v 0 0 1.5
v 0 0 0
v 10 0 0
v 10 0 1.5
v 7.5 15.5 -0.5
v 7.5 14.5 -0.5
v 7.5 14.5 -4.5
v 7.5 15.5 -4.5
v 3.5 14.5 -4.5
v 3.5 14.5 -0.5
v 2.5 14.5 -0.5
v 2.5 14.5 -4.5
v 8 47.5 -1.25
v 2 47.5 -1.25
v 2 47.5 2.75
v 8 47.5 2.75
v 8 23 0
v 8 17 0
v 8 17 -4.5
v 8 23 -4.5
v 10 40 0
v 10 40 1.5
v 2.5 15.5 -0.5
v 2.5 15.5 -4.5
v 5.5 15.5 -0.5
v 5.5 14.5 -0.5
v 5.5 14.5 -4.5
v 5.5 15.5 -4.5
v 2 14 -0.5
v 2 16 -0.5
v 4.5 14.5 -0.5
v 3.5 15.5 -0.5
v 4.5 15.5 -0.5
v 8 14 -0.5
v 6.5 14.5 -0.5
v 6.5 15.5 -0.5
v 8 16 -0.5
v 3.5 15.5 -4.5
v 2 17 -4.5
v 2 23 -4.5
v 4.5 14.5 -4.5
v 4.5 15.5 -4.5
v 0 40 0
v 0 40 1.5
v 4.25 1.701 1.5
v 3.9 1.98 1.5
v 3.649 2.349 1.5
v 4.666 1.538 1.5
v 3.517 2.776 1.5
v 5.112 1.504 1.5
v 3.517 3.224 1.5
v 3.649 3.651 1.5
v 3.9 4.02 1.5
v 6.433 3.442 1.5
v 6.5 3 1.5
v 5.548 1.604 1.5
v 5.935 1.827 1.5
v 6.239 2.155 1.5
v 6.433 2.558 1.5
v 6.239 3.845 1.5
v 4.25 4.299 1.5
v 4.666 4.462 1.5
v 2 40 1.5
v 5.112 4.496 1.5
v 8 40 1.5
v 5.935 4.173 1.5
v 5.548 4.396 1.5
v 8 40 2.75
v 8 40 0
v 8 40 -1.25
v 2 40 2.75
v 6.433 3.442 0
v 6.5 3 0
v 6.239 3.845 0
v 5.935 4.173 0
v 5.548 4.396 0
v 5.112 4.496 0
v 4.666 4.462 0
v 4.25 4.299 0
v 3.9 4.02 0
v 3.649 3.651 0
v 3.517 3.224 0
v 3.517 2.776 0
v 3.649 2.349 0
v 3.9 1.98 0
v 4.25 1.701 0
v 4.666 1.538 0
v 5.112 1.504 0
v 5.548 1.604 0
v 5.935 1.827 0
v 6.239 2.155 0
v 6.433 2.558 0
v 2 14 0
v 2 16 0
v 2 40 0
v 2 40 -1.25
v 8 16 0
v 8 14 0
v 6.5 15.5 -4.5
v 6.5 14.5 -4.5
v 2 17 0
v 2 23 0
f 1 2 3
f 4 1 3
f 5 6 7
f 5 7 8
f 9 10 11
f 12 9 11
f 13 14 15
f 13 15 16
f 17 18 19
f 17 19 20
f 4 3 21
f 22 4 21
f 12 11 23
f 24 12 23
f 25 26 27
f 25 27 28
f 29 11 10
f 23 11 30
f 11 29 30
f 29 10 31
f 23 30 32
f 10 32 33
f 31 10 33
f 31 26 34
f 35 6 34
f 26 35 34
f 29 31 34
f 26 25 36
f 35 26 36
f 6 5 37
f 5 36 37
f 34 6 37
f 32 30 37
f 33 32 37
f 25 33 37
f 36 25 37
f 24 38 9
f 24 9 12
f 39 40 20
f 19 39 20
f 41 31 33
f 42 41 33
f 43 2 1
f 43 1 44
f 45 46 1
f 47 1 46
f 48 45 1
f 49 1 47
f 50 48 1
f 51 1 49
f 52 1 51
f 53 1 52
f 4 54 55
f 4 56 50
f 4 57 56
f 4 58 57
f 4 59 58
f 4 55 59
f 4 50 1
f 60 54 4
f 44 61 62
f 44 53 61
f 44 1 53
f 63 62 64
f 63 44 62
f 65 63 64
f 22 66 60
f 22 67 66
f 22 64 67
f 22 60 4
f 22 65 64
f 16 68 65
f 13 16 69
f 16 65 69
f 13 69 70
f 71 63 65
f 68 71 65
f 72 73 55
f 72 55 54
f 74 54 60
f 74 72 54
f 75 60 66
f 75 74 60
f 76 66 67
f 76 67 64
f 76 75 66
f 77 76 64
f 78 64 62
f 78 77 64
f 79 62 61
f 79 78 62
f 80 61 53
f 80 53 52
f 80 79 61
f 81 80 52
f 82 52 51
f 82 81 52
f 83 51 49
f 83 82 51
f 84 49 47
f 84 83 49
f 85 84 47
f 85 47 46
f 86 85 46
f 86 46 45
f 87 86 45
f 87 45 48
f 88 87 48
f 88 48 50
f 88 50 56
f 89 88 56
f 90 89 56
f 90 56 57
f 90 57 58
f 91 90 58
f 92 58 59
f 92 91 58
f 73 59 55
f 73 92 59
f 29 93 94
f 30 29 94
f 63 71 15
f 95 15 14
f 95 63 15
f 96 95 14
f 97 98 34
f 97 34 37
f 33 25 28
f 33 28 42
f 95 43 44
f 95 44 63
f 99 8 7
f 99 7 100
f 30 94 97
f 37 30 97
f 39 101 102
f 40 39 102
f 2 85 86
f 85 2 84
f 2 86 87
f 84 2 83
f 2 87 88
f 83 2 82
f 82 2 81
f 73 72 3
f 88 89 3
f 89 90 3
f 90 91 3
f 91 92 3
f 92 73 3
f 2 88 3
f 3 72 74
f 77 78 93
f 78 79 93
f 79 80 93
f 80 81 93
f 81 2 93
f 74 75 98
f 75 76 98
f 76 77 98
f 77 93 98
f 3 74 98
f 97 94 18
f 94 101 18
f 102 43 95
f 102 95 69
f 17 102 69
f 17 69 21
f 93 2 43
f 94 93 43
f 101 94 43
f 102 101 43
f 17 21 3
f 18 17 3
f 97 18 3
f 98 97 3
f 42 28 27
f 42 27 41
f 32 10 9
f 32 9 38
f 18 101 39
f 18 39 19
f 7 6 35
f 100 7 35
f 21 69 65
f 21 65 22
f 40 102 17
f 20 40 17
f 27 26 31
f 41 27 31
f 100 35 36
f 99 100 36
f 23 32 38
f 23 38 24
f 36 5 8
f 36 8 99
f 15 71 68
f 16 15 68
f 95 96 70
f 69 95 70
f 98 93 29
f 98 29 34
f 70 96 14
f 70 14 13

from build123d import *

# Parameters (mm, degrees)
SKETCH_2_W      = 10
SKETCH_2_H      = 40
SKETCH_2_R      = 1.5
EXTRUDE_1_DEPTH = 1.5
SKETCH_3_3_W    = 6
SKETCH_3_3_H    = 6
EXTRUDE_3_DEPTH = 6
SKETCH_3_4_W    = 6
SKETCH_3_4_H    = 2
EXTRUDE_4_DEPTH = 2
SKETCH_4_W      = 1
SKETCH_4_H      = 1
EXTRUDE_5_DEPTH = 4
SKETCH_6_W      = 6
SKETCH_6_H      = 4
EXTRUDE_6_DEPTH = 7.5


with BuildPart() as part:
    # 草圖2 → 填料-伸長1 (new body)
    with BuildSketch(Plane.XY):
        with Locations((5, 20)):
            Rectangle(SKETCH_2_W, SKETCH_2_H)
        with Locations((5, 3)):
            Circle(SKETCH_2_R, mode=Mode.SUBTRACT)
    extrude(amount=EXTRUDE_1_DEPTH)

    # 草圖3<3> → 填料-伸長3 (add)
    with BuildSketch(Plane.XY.offset(1.5)):
        with Locations((5, 20)):
            Rectangle(SKETCH_3_3_W, SKETCH_3_3_H)
    extrude(amount=-EXTRUDE_3_DEPTH)

    # 草圖3<4> → 填料-伸長4 (add)
    with BuildSketch(Plane.XY.offset(1.5)):
        with Locations((5, 15)):
            Rectangle(SKETCH_3_4_W, SKETCH_3_4_H)
    extrude(amount=-EXTRUDE_4_DEPTH)

    # 草圖4 → 填料-伸長5 (add)
    with BuildSketch(Plane(origin=(0, 0, -0.5), x_dir=(-1, 0, 0), z_dir=(0, 0, -1))):
        with Locations((-5, 15)):
            Rectangle(SKETCH_4_W, SKETCH_4_H)
        with Locations((-7, 15)):
            Rectangle(SKETCH_4_W, SKETCH_4_H)
        with Locations((-3, 15)):
            Rectangle(SKETCH_4_W, SKETCH_4_H)
    extrude(amount=EXTRUDE_5_DEPTH)

    # 草圖6 → 填料-伸長6 (add)
    with BuildSketch(Plane(origin=(0, 40, 0), x_dir=(1, 0, 0), z_dir=(0, 1, 0))):
        with Locations((5, -0.75)):
            Rectangle(SKETCH_6_W, SKETCH_6_H)
    extrude(amount=EXTRUDE_6_DEPTH)


solid = part.part
